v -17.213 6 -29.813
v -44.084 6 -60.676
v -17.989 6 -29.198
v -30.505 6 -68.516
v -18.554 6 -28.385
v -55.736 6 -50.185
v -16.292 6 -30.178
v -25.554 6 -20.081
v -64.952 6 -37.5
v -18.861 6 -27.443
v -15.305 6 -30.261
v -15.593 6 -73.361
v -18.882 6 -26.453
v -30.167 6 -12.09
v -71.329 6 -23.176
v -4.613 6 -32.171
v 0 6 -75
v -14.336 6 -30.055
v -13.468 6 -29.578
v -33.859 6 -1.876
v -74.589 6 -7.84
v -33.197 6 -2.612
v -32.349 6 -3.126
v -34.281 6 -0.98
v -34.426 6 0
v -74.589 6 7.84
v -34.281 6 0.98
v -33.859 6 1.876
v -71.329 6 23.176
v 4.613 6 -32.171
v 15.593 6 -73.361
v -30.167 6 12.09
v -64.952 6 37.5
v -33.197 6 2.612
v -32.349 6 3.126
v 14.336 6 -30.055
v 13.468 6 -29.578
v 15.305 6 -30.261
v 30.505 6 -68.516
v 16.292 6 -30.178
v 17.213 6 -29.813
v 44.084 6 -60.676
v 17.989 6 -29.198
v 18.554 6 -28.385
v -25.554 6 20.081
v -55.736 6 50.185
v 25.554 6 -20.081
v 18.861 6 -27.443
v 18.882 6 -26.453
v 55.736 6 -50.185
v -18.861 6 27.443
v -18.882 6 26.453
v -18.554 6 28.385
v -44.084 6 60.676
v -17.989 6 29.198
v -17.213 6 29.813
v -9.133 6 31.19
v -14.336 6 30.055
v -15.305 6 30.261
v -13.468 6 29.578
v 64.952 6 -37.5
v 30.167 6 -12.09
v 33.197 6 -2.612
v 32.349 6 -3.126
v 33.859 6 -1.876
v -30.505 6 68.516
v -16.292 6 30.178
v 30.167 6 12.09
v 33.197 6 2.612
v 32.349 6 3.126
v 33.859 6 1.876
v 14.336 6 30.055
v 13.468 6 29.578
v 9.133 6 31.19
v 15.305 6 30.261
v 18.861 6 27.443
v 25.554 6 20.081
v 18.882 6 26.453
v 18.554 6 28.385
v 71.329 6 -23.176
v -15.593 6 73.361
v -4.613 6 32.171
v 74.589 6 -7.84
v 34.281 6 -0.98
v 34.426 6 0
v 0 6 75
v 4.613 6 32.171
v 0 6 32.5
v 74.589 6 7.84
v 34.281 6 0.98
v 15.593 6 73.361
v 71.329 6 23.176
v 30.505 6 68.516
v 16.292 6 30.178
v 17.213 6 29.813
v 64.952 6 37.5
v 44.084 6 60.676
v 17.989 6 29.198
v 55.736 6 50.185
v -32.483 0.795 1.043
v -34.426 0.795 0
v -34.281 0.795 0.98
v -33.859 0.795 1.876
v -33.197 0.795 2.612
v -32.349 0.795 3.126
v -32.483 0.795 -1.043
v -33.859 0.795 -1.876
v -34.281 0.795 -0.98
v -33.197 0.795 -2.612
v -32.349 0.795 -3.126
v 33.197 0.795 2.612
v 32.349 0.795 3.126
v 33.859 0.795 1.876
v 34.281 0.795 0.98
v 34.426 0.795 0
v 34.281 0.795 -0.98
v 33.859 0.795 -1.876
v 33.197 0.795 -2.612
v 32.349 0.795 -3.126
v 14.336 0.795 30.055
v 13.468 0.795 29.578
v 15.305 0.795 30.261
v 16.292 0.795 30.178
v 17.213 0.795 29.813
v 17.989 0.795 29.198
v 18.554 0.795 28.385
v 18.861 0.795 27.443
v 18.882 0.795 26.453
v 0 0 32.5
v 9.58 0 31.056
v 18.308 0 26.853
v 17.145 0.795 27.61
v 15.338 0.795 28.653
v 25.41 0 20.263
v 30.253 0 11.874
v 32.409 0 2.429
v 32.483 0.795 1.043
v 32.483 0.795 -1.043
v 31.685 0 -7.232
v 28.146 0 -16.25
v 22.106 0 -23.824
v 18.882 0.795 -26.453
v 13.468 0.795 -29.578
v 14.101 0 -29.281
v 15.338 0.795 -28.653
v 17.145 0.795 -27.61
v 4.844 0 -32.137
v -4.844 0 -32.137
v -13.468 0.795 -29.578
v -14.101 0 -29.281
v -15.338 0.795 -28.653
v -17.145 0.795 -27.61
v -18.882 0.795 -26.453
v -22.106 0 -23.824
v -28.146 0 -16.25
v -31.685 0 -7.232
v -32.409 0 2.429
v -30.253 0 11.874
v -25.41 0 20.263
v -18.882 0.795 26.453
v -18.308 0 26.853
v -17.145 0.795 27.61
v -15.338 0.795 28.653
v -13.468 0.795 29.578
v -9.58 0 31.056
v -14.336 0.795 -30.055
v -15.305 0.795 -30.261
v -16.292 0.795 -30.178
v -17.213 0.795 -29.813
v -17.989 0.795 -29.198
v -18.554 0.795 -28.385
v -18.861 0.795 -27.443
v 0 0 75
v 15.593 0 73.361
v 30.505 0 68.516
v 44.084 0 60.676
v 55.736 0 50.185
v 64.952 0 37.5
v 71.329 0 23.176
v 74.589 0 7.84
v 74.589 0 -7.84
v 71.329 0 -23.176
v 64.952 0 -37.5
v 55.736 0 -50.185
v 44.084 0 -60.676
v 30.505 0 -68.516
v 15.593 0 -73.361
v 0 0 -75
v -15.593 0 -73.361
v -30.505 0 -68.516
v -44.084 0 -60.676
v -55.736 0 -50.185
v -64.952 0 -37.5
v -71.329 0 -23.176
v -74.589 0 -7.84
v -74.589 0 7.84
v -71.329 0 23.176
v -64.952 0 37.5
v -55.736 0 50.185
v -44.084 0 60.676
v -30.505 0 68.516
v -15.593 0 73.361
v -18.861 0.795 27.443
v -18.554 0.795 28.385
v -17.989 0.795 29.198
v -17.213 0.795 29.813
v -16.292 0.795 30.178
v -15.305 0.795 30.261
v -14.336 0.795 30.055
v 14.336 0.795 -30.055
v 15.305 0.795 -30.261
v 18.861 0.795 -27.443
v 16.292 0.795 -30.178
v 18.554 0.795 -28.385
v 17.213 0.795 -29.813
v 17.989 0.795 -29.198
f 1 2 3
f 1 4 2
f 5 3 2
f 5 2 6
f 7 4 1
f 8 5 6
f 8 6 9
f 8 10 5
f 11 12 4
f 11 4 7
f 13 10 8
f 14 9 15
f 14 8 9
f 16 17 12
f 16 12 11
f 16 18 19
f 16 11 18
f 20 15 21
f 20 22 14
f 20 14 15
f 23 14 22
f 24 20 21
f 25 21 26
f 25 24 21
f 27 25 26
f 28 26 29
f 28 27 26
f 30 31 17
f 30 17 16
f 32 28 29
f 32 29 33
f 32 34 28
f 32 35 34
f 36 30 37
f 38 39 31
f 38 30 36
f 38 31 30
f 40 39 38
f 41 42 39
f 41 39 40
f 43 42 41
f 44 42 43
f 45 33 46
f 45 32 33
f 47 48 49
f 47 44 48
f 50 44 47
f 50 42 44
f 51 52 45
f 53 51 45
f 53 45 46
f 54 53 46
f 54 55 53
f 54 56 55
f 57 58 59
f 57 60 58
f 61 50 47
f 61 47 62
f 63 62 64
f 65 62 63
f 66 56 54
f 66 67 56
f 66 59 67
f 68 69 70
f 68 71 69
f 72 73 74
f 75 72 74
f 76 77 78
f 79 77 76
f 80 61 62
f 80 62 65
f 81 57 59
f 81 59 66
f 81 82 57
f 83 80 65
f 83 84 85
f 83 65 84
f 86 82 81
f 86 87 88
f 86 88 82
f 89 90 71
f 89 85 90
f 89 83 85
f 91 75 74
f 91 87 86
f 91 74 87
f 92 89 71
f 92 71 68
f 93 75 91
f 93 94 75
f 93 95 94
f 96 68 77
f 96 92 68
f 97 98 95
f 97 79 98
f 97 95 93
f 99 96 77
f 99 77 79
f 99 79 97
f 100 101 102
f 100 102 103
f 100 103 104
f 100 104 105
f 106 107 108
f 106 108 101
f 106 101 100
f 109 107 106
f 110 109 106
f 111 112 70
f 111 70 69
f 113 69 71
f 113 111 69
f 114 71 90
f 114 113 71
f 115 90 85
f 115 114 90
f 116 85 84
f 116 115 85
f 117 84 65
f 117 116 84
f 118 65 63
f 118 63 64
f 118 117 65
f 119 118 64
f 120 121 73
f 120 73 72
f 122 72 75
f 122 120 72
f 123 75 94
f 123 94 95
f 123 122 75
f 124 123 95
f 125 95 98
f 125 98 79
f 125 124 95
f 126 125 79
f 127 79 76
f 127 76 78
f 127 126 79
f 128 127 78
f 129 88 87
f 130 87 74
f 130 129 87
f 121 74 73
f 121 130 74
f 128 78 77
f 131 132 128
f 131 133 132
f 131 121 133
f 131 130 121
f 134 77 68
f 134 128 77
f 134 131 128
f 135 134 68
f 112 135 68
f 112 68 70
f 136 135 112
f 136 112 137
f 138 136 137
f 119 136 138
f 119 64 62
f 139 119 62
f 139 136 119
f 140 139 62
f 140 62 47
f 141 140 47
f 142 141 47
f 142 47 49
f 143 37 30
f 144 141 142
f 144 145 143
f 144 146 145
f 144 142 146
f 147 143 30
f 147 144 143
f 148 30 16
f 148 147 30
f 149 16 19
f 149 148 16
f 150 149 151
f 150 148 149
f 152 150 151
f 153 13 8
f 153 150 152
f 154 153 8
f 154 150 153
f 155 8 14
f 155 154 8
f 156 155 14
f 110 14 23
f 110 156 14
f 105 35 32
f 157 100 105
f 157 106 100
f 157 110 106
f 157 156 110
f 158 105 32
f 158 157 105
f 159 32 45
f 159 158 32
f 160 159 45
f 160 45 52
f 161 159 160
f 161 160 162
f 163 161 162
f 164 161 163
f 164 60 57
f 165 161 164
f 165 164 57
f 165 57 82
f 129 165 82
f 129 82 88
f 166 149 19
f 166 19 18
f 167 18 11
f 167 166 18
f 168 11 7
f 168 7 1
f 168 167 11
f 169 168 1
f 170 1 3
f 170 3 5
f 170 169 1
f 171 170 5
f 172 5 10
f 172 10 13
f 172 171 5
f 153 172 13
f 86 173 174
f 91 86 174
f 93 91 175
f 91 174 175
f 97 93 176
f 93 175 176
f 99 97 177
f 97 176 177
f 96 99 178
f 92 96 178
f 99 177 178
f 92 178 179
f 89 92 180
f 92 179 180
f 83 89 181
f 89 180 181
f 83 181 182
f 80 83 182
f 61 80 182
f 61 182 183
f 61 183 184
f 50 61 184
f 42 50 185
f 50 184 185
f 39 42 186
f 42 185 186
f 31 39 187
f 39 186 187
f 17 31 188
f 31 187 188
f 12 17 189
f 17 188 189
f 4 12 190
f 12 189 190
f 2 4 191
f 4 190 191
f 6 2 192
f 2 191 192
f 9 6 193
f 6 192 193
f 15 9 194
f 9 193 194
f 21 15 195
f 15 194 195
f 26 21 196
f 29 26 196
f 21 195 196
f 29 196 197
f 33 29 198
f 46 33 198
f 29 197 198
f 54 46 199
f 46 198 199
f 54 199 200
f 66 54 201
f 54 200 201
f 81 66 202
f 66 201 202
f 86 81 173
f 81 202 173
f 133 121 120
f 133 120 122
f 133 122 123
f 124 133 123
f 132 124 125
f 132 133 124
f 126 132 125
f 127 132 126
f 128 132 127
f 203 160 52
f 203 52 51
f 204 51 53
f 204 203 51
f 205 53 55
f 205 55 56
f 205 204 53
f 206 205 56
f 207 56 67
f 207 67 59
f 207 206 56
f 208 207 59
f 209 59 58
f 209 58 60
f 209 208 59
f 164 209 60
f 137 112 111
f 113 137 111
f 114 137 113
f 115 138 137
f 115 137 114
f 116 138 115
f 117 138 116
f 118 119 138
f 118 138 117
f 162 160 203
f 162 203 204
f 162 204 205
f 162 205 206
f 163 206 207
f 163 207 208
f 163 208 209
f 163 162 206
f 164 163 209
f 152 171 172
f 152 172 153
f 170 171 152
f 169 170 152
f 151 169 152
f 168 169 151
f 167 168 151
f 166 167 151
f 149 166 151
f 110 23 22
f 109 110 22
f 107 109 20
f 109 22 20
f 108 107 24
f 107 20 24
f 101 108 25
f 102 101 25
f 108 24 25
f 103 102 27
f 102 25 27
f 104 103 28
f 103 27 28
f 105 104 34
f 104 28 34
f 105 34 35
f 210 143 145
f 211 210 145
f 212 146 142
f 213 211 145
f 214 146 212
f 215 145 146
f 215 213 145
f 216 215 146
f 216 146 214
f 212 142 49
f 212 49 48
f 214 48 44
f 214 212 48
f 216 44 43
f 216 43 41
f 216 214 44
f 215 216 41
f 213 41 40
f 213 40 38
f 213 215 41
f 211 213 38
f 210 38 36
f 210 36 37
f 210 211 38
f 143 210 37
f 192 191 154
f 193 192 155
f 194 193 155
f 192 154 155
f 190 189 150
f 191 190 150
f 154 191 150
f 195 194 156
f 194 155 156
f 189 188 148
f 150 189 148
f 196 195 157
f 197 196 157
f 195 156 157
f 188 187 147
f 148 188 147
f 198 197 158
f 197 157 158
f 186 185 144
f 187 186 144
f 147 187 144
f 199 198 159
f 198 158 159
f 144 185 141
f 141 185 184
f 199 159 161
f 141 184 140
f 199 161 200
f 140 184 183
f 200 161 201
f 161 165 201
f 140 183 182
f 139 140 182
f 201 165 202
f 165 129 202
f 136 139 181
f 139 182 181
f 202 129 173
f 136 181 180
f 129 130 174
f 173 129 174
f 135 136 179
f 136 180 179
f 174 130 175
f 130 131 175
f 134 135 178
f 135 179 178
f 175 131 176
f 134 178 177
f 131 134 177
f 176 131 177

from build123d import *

# Parameters (mm, degrees)
SKETCH1_R           = 75
BOSS_EXTRUDE1_DEPTH = 6
SKETCH2_R           = 32.5
CUT_EXTRUDE1_DEPTH  = 107.235587258
SKETCH3_R           = 3.390748994
CUT_EXTRUDE2_DEPTH  = 5.20472754
CIRPATTERN1_COUNT   = 6


with BuildPart() as part:
    # Sketch1 → Boss-Extrude1 (new body)
    with BuildSketch(Plane(origin=(0, 0, 0), x_dir=(1, 0, 0), z_dir=(0, 1, 0))):
        Circle(SKETCH1_R)
    extrude(amount=BOSS_EXTRUDE1_DEPTH)

    # Sketch2 → Cut-Extrude1 (cut, through all)
    with BuildSketch(Plane(origin=(0, 0, 0), x_dir=(1, 0, 0), z_dir=(0, 1, 0))):
        Circle(SKETCH2_R)
    extrude(amount=CUT_EXTRUDE1_DEPTH, mode=Mode.SUBTRACT)

    # Sketch3 → Cut-Extrude2 (cut)
    with BuildSketch(Plane(origin=(0, 6, 0), x_dir=(1, 0, 0), z_dir=(0, 1, 0))):
        with Locations((-31.034865261, 0)):
            Circle(SKETCH3_R)
    cut_extrude2 = extrude(amount=-CUT_EXTRUDE2_DEPTH, mode=Mode.SUBTRACT)

    # CirPattern1: Cut-Extrude2 ×6 about axis
    cirpattern1_axis = Axis((0, 0, 0), (0, 1, 0))
    for i in range(1, CIRPATTERN1_COUNT):
        add(cut_extrude2.rotate(cirpattern1_axis, i * 360 / CIRPATTERN1_COUNT), mode=Mode.SUBTRACT)


solid = part.part
